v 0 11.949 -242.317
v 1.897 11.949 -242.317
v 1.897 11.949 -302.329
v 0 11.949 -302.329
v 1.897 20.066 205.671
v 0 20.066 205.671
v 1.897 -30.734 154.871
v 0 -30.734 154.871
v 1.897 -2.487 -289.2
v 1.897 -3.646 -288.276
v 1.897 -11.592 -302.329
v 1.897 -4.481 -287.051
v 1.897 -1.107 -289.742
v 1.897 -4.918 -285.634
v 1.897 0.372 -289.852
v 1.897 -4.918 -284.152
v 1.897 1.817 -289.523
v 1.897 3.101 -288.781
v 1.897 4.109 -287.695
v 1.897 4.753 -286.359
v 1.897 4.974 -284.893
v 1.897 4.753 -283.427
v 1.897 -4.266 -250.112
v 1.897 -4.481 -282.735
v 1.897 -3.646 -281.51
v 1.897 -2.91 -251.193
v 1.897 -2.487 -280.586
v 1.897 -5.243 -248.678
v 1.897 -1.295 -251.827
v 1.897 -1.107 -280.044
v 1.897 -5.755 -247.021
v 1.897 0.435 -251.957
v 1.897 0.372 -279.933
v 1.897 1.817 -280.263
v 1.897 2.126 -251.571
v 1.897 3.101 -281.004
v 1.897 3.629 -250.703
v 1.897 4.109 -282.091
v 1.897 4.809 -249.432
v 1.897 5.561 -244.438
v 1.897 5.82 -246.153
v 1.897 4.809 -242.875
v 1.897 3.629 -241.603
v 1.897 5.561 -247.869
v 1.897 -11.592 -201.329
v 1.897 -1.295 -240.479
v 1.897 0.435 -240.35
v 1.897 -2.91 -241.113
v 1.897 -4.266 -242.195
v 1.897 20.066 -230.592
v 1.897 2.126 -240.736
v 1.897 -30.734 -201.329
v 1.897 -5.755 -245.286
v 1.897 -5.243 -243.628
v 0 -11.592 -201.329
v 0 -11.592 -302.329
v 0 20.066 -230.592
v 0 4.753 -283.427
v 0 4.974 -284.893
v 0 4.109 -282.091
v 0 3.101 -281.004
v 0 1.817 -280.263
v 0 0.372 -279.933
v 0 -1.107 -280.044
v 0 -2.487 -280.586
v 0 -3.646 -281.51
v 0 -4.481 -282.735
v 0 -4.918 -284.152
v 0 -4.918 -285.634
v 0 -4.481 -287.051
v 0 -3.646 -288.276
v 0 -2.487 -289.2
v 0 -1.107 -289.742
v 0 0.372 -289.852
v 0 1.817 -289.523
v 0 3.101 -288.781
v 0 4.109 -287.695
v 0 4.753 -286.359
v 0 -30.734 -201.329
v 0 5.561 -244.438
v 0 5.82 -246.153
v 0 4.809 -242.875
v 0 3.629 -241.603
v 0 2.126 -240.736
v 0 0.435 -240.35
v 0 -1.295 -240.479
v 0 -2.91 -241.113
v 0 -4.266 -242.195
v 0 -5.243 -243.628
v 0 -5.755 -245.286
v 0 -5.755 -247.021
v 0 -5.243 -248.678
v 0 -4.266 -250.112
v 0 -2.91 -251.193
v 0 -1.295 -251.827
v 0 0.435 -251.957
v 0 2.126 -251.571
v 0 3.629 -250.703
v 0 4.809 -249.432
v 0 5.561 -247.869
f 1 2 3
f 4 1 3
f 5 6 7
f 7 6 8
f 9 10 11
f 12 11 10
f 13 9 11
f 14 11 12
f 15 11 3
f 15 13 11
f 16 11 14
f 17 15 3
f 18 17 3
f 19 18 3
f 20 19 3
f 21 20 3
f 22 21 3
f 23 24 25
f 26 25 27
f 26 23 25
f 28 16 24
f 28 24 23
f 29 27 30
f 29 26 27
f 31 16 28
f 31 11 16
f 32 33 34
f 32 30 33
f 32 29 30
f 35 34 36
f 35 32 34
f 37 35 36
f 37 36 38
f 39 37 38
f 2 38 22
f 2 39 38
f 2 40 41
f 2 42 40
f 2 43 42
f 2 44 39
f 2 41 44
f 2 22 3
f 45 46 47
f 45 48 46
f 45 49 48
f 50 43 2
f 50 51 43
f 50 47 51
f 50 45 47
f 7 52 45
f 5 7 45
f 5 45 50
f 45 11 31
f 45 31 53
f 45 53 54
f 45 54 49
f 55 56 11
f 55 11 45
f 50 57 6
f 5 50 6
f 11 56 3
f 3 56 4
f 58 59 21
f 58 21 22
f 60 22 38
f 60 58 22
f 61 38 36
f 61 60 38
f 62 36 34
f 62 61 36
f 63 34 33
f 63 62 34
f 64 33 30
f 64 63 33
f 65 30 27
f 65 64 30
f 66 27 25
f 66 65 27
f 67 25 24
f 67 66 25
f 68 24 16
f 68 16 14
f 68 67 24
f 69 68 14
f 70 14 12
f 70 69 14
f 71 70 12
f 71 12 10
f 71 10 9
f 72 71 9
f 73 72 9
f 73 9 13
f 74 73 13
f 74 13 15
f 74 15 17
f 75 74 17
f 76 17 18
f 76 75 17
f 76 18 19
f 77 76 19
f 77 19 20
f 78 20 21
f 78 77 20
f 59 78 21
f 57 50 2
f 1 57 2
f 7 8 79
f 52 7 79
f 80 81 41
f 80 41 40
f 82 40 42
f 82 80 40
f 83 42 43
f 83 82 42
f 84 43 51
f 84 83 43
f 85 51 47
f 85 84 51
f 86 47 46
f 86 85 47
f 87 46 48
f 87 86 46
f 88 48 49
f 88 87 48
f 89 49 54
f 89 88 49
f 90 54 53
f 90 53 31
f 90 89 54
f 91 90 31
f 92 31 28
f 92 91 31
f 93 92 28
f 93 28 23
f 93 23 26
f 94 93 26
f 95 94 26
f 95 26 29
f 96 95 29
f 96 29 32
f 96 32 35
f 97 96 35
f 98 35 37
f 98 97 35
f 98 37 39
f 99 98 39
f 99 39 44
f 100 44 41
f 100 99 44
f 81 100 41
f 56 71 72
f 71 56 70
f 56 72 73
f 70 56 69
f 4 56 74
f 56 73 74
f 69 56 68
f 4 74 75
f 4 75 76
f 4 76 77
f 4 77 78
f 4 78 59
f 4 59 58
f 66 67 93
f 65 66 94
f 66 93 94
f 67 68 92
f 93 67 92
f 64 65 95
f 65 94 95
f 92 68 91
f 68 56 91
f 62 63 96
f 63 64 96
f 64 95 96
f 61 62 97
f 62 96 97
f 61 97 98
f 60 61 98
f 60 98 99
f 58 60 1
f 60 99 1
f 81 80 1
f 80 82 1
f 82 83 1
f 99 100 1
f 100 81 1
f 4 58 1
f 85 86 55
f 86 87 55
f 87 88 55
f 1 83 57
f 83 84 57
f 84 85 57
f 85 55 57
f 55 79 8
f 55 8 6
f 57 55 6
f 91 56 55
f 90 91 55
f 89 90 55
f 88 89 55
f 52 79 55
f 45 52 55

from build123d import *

# Parameters (mm, degrees)
F0_R     = 4.973557
F0_R_2   = 5.819766
F1_DEPTH = 1.89738
F2_DEPTH = 1.89738
F5_DEPTH = 25.4
F6_W     = 20.362974
F6_H     = 103.774652
F7_DEPTH = 1.89838


with BuildPart() as f1:
    # F0 (on Right) → F1 (new body)
    with BuildSketch(Plane.YZ):
        Polygon((20.065772, -302.329028), (20.065772, 205.670972), (-30.734228, 154.870972), (-30.734228, -302.329028), align=None)
        with Locations((0, -284.892797)):
            Circle(F0_R, mode=Mode.SUBTRACT)
        with Locations((0, -246.153131)):
            Circle(F0_R_2, mode=Mode.SUBTRACT)
    extrude(amount=F1_DEPTH)

    # F0 (on Right) → F2 (join)
    with BuildSketch(Plane.YZ):
        Polygon((20.065772, -302.329028), (20.065772, 205.670972), (-30.734228, 154.870972), (-30.734228, -302.329028), align=None)
        with Locations((0, -284.892797)):
            Circle(F0_R, mode=Mode.SUBTRACT)
        with Locations((0, -246.153131)):
            Circle(F0_R_2, mode=Mode.SUBTRACT)
    extrude(amount=F2_DEPTH)

    # F4 (on face) → F5 (cut)
    with BuildSketch(Plane.YZ.offset(1.89738)):
        Polygon((-30.734228, -234.08674), (-31.288195, -233.662769), (-31.288195, -303.030223), (-19.98027, -303.18138), (-19.98027, -302.329028), (-30.734228, -302.329028), align=None)
        Polygon((20.065772, -302.329028), (11.948531, -302.329028), (11.948531, -303.18138), (20.324497, -303.18138), (20.928504, -229.346052), (20.065772, -230.59222), align=None)
        Polygon((11.948531, -242.317125), (11.948531, -302.329028), (20.065772, -302.329028), (20.065772, -230.59222), align=None)
        Polygon((-19.98027, -242.317125), (-30.734228, -234.08674), (-30.734228, -302.329028), (-19.98027, -302.329028), align=None)
    extrude(amount=-F5_DEPTH, mode=Mode.SUBTRACT)

    # F6 (on Right) → F7 (cut, through all)
    with BuildSketch(Plane.YZ):
        with Locations((-21.773375, -253.215976)):
            Rectangle(F6_W, F6_H)
    extrude(amount=F7_DEPTH, mode=Mode.SUBTRACT)


solid = f1.part
